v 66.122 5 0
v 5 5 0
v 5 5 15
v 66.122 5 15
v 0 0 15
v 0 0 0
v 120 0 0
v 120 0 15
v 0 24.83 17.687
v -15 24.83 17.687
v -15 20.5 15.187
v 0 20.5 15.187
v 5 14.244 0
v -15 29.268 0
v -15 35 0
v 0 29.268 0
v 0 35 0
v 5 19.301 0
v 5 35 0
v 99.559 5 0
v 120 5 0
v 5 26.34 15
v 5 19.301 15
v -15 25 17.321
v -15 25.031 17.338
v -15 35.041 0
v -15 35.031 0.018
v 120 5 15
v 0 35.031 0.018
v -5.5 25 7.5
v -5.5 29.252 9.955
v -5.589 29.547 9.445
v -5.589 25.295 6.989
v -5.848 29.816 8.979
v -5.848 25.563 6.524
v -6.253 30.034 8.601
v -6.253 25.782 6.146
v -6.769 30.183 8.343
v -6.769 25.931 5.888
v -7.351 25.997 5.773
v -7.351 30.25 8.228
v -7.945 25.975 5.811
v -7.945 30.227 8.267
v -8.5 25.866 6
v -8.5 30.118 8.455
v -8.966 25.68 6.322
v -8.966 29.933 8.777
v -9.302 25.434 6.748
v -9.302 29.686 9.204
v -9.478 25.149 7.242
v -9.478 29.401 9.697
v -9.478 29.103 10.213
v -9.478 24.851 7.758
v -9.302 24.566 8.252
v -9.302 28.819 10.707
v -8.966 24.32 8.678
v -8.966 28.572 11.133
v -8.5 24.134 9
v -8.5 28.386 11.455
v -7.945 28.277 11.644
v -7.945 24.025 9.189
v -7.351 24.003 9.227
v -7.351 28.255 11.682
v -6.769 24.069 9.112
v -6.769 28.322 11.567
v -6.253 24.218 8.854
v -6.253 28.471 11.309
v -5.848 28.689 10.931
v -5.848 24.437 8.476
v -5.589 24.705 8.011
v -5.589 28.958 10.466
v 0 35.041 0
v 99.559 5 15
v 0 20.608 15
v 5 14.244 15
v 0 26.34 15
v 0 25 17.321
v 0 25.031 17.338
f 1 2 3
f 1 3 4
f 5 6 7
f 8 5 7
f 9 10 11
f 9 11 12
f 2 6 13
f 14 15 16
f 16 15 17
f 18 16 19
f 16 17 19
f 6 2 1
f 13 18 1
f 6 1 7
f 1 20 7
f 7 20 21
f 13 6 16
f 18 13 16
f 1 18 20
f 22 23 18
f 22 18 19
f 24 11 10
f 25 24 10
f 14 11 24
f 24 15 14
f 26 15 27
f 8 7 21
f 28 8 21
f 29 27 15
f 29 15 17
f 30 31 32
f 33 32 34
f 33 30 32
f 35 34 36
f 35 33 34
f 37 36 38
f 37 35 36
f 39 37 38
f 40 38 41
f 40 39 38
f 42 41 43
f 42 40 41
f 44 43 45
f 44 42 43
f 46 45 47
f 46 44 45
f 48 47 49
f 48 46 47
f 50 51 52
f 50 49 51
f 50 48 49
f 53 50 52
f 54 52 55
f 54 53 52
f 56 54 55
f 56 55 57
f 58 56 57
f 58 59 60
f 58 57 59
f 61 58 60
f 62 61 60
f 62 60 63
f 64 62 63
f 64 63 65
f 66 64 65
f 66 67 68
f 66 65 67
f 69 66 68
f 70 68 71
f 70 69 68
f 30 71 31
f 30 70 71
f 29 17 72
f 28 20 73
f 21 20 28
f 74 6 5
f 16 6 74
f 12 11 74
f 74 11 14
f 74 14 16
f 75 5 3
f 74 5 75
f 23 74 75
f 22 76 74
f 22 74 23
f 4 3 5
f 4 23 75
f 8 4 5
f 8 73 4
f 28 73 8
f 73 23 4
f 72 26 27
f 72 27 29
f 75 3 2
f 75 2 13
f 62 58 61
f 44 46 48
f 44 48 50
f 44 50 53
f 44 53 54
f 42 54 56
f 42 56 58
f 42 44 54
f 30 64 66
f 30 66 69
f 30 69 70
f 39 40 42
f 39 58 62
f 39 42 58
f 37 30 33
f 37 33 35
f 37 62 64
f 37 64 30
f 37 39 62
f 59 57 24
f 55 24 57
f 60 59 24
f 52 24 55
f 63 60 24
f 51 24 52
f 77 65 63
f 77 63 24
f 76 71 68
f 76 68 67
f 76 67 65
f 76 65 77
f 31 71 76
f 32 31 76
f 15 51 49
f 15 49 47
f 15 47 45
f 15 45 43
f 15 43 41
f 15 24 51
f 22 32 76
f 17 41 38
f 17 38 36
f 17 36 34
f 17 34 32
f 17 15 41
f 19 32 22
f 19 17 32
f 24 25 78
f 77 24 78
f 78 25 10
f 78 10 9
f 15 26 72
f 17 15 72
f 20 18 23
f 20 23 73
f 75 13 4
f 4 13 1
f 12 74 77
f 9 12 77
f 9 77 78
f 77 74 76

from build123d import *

# Parameters (mm, degrees)
CYLINDER_R             = 2
CYLINDER_DEPTH         = 10
CYLINDER_ROLL_ANGLE    = -60
BOX003_W               = 20
BOX003_H               = 10
BOX003_DEPTH           = 20
BOX003_PLACEMENT_ANGLE = 30
BOX005_W               = 20
BOX005_H               = 20
BOX005_DEPTH           = 5
BOX001_W               = 5
BOX001_H               = 35
BOX001_DEPTH           = 15
BOX002_W               = 15
BOX002_H               = 5
BOX002_DEPTH           = 21
BOX002_PLACEMENT_ANGLE = 30
BOX004_W               = 100
BOX004_H               = 5
BOX004_DEPTH           = 15
BOX004_PLACEMENT_ANGLE = -8.6
BOX_W                  = 120
BOX_H                  = 5
BOX_DEPTH              = 15


with BuildPart() as cylinder:
    # Cylinder → Cylinder (new body)
    with BuildSketch(Plane.XY):
        Circle(CYLINDER_R)
    extrude(amount=CYLINDER_DEPTH)


with BuildPart() as cylinder_1:
    # Cylinder roll: moved
    add(cylinder.part.rotate(Axis((0, 0, 0), (1, 0, 0)), CYLINDER_ROLL_ANGLE))


with BuildPart() as cylinder_2:
    # Cylinder placement: moved
    add(cylinder_1.part.moved(Location((-7.5, 25, 7.5))))


with BuildPart() as cube003:
    # Box003 → Box003 (new body)
    with BuildSketch(Plane.XY):
        with Locations((10, 5)):
            Rectangle(BOX003_W, BOX003_H)
    extrude(amount=BOX003_DEPTH)


with BuildPart() as cube003_1:
    # Box003 placement: moved
    add(cube003.part.moved(Location((-15, 35, 0))).rotate(Axis((-15, 35, 0), (1, 0, 0)), BOX003_PLACEMENT_ANGLE))


with BuildPart() as cube005:
    # Box005 → Box005 (new body)
    with BuildSketch(Plane(origin=(-15, 25, -5), x_dir=(1, 0, 0), z_dir=(0, 0, 1))):
        with Locations((10, 10)):
            Rectangle(BOX005_W, BOX005_H)
    extrude(amount=BOX005_DEPTH)


with BuildPart() as cube001:
    # Box001 → Box001 (new body)
    with BuildSketch(Plane.XY):
        with Locations((2.5, 17.5)):
            Rectangle(BOX001_W, BOX001_H)
    extrude(amount=BOX001_DEPTH)


with BuildPart() as cube002:
    # Box002 → Box002 (new body)
    with BuildSketch(Plane.XY):
        with Locations((7.5, 2.5)):
            Rectangle(BOX002_W, BOX002_H)
    extrude(amount=BOX002_DEPTH)


with BuildPart() as cube002_1:
    # Box002 placement: moved
    add(cube002.part.moved(Location((-15, 31, -3))).rotate(Axis((-15, 31, -3), (1, 0, 0)), BOX002_PLACEMENT_ANGLE))


with BuildPart() as cube004:
    # Box004 → Box004 (new body)
    with BuildSketch(Plane.XY):
        with Locations((50, 2.5)):
            Rectangle(BOX004_W, BOX004_H)
    extrude(amount=BOX004_DEPTH)


with BuildPart() as cube004_1:
    # Box004 placement: moved
    add(cube004.part.moved(Location((0, 15, 0))).rotate(Axis((0, 15, 0), (0, 0, 1)), BOX004_PLACEMENT_ANGLE))


with BuildPart() as z_probe_release_strut:
    # Box → Box (new body)
    with BuildSketch(Plane.XY):
        with Locations((60, 2.5)):
            Rectangle(BOX_W, BOX_H)
    extrude(amount=BOX_DEPTH)

    # Fusion: union Cube001, Cube002, Cube004
    add(cube001.part)
    add(cube002_1.part)
    add(cube004_1.part)

    # Cut: cut Cube005
    add(cube005.part, mode=Mode.SUBTRACT)

    # Cut001: cut Cube003
    add(cube003_1.part, mode=Mode.SUBTRACT)

    # Cut002: cut Cylinder
    add(cylinder_2.part, mode=Mode.SUBTRACT)


solid = z_probe_release_strut.part
